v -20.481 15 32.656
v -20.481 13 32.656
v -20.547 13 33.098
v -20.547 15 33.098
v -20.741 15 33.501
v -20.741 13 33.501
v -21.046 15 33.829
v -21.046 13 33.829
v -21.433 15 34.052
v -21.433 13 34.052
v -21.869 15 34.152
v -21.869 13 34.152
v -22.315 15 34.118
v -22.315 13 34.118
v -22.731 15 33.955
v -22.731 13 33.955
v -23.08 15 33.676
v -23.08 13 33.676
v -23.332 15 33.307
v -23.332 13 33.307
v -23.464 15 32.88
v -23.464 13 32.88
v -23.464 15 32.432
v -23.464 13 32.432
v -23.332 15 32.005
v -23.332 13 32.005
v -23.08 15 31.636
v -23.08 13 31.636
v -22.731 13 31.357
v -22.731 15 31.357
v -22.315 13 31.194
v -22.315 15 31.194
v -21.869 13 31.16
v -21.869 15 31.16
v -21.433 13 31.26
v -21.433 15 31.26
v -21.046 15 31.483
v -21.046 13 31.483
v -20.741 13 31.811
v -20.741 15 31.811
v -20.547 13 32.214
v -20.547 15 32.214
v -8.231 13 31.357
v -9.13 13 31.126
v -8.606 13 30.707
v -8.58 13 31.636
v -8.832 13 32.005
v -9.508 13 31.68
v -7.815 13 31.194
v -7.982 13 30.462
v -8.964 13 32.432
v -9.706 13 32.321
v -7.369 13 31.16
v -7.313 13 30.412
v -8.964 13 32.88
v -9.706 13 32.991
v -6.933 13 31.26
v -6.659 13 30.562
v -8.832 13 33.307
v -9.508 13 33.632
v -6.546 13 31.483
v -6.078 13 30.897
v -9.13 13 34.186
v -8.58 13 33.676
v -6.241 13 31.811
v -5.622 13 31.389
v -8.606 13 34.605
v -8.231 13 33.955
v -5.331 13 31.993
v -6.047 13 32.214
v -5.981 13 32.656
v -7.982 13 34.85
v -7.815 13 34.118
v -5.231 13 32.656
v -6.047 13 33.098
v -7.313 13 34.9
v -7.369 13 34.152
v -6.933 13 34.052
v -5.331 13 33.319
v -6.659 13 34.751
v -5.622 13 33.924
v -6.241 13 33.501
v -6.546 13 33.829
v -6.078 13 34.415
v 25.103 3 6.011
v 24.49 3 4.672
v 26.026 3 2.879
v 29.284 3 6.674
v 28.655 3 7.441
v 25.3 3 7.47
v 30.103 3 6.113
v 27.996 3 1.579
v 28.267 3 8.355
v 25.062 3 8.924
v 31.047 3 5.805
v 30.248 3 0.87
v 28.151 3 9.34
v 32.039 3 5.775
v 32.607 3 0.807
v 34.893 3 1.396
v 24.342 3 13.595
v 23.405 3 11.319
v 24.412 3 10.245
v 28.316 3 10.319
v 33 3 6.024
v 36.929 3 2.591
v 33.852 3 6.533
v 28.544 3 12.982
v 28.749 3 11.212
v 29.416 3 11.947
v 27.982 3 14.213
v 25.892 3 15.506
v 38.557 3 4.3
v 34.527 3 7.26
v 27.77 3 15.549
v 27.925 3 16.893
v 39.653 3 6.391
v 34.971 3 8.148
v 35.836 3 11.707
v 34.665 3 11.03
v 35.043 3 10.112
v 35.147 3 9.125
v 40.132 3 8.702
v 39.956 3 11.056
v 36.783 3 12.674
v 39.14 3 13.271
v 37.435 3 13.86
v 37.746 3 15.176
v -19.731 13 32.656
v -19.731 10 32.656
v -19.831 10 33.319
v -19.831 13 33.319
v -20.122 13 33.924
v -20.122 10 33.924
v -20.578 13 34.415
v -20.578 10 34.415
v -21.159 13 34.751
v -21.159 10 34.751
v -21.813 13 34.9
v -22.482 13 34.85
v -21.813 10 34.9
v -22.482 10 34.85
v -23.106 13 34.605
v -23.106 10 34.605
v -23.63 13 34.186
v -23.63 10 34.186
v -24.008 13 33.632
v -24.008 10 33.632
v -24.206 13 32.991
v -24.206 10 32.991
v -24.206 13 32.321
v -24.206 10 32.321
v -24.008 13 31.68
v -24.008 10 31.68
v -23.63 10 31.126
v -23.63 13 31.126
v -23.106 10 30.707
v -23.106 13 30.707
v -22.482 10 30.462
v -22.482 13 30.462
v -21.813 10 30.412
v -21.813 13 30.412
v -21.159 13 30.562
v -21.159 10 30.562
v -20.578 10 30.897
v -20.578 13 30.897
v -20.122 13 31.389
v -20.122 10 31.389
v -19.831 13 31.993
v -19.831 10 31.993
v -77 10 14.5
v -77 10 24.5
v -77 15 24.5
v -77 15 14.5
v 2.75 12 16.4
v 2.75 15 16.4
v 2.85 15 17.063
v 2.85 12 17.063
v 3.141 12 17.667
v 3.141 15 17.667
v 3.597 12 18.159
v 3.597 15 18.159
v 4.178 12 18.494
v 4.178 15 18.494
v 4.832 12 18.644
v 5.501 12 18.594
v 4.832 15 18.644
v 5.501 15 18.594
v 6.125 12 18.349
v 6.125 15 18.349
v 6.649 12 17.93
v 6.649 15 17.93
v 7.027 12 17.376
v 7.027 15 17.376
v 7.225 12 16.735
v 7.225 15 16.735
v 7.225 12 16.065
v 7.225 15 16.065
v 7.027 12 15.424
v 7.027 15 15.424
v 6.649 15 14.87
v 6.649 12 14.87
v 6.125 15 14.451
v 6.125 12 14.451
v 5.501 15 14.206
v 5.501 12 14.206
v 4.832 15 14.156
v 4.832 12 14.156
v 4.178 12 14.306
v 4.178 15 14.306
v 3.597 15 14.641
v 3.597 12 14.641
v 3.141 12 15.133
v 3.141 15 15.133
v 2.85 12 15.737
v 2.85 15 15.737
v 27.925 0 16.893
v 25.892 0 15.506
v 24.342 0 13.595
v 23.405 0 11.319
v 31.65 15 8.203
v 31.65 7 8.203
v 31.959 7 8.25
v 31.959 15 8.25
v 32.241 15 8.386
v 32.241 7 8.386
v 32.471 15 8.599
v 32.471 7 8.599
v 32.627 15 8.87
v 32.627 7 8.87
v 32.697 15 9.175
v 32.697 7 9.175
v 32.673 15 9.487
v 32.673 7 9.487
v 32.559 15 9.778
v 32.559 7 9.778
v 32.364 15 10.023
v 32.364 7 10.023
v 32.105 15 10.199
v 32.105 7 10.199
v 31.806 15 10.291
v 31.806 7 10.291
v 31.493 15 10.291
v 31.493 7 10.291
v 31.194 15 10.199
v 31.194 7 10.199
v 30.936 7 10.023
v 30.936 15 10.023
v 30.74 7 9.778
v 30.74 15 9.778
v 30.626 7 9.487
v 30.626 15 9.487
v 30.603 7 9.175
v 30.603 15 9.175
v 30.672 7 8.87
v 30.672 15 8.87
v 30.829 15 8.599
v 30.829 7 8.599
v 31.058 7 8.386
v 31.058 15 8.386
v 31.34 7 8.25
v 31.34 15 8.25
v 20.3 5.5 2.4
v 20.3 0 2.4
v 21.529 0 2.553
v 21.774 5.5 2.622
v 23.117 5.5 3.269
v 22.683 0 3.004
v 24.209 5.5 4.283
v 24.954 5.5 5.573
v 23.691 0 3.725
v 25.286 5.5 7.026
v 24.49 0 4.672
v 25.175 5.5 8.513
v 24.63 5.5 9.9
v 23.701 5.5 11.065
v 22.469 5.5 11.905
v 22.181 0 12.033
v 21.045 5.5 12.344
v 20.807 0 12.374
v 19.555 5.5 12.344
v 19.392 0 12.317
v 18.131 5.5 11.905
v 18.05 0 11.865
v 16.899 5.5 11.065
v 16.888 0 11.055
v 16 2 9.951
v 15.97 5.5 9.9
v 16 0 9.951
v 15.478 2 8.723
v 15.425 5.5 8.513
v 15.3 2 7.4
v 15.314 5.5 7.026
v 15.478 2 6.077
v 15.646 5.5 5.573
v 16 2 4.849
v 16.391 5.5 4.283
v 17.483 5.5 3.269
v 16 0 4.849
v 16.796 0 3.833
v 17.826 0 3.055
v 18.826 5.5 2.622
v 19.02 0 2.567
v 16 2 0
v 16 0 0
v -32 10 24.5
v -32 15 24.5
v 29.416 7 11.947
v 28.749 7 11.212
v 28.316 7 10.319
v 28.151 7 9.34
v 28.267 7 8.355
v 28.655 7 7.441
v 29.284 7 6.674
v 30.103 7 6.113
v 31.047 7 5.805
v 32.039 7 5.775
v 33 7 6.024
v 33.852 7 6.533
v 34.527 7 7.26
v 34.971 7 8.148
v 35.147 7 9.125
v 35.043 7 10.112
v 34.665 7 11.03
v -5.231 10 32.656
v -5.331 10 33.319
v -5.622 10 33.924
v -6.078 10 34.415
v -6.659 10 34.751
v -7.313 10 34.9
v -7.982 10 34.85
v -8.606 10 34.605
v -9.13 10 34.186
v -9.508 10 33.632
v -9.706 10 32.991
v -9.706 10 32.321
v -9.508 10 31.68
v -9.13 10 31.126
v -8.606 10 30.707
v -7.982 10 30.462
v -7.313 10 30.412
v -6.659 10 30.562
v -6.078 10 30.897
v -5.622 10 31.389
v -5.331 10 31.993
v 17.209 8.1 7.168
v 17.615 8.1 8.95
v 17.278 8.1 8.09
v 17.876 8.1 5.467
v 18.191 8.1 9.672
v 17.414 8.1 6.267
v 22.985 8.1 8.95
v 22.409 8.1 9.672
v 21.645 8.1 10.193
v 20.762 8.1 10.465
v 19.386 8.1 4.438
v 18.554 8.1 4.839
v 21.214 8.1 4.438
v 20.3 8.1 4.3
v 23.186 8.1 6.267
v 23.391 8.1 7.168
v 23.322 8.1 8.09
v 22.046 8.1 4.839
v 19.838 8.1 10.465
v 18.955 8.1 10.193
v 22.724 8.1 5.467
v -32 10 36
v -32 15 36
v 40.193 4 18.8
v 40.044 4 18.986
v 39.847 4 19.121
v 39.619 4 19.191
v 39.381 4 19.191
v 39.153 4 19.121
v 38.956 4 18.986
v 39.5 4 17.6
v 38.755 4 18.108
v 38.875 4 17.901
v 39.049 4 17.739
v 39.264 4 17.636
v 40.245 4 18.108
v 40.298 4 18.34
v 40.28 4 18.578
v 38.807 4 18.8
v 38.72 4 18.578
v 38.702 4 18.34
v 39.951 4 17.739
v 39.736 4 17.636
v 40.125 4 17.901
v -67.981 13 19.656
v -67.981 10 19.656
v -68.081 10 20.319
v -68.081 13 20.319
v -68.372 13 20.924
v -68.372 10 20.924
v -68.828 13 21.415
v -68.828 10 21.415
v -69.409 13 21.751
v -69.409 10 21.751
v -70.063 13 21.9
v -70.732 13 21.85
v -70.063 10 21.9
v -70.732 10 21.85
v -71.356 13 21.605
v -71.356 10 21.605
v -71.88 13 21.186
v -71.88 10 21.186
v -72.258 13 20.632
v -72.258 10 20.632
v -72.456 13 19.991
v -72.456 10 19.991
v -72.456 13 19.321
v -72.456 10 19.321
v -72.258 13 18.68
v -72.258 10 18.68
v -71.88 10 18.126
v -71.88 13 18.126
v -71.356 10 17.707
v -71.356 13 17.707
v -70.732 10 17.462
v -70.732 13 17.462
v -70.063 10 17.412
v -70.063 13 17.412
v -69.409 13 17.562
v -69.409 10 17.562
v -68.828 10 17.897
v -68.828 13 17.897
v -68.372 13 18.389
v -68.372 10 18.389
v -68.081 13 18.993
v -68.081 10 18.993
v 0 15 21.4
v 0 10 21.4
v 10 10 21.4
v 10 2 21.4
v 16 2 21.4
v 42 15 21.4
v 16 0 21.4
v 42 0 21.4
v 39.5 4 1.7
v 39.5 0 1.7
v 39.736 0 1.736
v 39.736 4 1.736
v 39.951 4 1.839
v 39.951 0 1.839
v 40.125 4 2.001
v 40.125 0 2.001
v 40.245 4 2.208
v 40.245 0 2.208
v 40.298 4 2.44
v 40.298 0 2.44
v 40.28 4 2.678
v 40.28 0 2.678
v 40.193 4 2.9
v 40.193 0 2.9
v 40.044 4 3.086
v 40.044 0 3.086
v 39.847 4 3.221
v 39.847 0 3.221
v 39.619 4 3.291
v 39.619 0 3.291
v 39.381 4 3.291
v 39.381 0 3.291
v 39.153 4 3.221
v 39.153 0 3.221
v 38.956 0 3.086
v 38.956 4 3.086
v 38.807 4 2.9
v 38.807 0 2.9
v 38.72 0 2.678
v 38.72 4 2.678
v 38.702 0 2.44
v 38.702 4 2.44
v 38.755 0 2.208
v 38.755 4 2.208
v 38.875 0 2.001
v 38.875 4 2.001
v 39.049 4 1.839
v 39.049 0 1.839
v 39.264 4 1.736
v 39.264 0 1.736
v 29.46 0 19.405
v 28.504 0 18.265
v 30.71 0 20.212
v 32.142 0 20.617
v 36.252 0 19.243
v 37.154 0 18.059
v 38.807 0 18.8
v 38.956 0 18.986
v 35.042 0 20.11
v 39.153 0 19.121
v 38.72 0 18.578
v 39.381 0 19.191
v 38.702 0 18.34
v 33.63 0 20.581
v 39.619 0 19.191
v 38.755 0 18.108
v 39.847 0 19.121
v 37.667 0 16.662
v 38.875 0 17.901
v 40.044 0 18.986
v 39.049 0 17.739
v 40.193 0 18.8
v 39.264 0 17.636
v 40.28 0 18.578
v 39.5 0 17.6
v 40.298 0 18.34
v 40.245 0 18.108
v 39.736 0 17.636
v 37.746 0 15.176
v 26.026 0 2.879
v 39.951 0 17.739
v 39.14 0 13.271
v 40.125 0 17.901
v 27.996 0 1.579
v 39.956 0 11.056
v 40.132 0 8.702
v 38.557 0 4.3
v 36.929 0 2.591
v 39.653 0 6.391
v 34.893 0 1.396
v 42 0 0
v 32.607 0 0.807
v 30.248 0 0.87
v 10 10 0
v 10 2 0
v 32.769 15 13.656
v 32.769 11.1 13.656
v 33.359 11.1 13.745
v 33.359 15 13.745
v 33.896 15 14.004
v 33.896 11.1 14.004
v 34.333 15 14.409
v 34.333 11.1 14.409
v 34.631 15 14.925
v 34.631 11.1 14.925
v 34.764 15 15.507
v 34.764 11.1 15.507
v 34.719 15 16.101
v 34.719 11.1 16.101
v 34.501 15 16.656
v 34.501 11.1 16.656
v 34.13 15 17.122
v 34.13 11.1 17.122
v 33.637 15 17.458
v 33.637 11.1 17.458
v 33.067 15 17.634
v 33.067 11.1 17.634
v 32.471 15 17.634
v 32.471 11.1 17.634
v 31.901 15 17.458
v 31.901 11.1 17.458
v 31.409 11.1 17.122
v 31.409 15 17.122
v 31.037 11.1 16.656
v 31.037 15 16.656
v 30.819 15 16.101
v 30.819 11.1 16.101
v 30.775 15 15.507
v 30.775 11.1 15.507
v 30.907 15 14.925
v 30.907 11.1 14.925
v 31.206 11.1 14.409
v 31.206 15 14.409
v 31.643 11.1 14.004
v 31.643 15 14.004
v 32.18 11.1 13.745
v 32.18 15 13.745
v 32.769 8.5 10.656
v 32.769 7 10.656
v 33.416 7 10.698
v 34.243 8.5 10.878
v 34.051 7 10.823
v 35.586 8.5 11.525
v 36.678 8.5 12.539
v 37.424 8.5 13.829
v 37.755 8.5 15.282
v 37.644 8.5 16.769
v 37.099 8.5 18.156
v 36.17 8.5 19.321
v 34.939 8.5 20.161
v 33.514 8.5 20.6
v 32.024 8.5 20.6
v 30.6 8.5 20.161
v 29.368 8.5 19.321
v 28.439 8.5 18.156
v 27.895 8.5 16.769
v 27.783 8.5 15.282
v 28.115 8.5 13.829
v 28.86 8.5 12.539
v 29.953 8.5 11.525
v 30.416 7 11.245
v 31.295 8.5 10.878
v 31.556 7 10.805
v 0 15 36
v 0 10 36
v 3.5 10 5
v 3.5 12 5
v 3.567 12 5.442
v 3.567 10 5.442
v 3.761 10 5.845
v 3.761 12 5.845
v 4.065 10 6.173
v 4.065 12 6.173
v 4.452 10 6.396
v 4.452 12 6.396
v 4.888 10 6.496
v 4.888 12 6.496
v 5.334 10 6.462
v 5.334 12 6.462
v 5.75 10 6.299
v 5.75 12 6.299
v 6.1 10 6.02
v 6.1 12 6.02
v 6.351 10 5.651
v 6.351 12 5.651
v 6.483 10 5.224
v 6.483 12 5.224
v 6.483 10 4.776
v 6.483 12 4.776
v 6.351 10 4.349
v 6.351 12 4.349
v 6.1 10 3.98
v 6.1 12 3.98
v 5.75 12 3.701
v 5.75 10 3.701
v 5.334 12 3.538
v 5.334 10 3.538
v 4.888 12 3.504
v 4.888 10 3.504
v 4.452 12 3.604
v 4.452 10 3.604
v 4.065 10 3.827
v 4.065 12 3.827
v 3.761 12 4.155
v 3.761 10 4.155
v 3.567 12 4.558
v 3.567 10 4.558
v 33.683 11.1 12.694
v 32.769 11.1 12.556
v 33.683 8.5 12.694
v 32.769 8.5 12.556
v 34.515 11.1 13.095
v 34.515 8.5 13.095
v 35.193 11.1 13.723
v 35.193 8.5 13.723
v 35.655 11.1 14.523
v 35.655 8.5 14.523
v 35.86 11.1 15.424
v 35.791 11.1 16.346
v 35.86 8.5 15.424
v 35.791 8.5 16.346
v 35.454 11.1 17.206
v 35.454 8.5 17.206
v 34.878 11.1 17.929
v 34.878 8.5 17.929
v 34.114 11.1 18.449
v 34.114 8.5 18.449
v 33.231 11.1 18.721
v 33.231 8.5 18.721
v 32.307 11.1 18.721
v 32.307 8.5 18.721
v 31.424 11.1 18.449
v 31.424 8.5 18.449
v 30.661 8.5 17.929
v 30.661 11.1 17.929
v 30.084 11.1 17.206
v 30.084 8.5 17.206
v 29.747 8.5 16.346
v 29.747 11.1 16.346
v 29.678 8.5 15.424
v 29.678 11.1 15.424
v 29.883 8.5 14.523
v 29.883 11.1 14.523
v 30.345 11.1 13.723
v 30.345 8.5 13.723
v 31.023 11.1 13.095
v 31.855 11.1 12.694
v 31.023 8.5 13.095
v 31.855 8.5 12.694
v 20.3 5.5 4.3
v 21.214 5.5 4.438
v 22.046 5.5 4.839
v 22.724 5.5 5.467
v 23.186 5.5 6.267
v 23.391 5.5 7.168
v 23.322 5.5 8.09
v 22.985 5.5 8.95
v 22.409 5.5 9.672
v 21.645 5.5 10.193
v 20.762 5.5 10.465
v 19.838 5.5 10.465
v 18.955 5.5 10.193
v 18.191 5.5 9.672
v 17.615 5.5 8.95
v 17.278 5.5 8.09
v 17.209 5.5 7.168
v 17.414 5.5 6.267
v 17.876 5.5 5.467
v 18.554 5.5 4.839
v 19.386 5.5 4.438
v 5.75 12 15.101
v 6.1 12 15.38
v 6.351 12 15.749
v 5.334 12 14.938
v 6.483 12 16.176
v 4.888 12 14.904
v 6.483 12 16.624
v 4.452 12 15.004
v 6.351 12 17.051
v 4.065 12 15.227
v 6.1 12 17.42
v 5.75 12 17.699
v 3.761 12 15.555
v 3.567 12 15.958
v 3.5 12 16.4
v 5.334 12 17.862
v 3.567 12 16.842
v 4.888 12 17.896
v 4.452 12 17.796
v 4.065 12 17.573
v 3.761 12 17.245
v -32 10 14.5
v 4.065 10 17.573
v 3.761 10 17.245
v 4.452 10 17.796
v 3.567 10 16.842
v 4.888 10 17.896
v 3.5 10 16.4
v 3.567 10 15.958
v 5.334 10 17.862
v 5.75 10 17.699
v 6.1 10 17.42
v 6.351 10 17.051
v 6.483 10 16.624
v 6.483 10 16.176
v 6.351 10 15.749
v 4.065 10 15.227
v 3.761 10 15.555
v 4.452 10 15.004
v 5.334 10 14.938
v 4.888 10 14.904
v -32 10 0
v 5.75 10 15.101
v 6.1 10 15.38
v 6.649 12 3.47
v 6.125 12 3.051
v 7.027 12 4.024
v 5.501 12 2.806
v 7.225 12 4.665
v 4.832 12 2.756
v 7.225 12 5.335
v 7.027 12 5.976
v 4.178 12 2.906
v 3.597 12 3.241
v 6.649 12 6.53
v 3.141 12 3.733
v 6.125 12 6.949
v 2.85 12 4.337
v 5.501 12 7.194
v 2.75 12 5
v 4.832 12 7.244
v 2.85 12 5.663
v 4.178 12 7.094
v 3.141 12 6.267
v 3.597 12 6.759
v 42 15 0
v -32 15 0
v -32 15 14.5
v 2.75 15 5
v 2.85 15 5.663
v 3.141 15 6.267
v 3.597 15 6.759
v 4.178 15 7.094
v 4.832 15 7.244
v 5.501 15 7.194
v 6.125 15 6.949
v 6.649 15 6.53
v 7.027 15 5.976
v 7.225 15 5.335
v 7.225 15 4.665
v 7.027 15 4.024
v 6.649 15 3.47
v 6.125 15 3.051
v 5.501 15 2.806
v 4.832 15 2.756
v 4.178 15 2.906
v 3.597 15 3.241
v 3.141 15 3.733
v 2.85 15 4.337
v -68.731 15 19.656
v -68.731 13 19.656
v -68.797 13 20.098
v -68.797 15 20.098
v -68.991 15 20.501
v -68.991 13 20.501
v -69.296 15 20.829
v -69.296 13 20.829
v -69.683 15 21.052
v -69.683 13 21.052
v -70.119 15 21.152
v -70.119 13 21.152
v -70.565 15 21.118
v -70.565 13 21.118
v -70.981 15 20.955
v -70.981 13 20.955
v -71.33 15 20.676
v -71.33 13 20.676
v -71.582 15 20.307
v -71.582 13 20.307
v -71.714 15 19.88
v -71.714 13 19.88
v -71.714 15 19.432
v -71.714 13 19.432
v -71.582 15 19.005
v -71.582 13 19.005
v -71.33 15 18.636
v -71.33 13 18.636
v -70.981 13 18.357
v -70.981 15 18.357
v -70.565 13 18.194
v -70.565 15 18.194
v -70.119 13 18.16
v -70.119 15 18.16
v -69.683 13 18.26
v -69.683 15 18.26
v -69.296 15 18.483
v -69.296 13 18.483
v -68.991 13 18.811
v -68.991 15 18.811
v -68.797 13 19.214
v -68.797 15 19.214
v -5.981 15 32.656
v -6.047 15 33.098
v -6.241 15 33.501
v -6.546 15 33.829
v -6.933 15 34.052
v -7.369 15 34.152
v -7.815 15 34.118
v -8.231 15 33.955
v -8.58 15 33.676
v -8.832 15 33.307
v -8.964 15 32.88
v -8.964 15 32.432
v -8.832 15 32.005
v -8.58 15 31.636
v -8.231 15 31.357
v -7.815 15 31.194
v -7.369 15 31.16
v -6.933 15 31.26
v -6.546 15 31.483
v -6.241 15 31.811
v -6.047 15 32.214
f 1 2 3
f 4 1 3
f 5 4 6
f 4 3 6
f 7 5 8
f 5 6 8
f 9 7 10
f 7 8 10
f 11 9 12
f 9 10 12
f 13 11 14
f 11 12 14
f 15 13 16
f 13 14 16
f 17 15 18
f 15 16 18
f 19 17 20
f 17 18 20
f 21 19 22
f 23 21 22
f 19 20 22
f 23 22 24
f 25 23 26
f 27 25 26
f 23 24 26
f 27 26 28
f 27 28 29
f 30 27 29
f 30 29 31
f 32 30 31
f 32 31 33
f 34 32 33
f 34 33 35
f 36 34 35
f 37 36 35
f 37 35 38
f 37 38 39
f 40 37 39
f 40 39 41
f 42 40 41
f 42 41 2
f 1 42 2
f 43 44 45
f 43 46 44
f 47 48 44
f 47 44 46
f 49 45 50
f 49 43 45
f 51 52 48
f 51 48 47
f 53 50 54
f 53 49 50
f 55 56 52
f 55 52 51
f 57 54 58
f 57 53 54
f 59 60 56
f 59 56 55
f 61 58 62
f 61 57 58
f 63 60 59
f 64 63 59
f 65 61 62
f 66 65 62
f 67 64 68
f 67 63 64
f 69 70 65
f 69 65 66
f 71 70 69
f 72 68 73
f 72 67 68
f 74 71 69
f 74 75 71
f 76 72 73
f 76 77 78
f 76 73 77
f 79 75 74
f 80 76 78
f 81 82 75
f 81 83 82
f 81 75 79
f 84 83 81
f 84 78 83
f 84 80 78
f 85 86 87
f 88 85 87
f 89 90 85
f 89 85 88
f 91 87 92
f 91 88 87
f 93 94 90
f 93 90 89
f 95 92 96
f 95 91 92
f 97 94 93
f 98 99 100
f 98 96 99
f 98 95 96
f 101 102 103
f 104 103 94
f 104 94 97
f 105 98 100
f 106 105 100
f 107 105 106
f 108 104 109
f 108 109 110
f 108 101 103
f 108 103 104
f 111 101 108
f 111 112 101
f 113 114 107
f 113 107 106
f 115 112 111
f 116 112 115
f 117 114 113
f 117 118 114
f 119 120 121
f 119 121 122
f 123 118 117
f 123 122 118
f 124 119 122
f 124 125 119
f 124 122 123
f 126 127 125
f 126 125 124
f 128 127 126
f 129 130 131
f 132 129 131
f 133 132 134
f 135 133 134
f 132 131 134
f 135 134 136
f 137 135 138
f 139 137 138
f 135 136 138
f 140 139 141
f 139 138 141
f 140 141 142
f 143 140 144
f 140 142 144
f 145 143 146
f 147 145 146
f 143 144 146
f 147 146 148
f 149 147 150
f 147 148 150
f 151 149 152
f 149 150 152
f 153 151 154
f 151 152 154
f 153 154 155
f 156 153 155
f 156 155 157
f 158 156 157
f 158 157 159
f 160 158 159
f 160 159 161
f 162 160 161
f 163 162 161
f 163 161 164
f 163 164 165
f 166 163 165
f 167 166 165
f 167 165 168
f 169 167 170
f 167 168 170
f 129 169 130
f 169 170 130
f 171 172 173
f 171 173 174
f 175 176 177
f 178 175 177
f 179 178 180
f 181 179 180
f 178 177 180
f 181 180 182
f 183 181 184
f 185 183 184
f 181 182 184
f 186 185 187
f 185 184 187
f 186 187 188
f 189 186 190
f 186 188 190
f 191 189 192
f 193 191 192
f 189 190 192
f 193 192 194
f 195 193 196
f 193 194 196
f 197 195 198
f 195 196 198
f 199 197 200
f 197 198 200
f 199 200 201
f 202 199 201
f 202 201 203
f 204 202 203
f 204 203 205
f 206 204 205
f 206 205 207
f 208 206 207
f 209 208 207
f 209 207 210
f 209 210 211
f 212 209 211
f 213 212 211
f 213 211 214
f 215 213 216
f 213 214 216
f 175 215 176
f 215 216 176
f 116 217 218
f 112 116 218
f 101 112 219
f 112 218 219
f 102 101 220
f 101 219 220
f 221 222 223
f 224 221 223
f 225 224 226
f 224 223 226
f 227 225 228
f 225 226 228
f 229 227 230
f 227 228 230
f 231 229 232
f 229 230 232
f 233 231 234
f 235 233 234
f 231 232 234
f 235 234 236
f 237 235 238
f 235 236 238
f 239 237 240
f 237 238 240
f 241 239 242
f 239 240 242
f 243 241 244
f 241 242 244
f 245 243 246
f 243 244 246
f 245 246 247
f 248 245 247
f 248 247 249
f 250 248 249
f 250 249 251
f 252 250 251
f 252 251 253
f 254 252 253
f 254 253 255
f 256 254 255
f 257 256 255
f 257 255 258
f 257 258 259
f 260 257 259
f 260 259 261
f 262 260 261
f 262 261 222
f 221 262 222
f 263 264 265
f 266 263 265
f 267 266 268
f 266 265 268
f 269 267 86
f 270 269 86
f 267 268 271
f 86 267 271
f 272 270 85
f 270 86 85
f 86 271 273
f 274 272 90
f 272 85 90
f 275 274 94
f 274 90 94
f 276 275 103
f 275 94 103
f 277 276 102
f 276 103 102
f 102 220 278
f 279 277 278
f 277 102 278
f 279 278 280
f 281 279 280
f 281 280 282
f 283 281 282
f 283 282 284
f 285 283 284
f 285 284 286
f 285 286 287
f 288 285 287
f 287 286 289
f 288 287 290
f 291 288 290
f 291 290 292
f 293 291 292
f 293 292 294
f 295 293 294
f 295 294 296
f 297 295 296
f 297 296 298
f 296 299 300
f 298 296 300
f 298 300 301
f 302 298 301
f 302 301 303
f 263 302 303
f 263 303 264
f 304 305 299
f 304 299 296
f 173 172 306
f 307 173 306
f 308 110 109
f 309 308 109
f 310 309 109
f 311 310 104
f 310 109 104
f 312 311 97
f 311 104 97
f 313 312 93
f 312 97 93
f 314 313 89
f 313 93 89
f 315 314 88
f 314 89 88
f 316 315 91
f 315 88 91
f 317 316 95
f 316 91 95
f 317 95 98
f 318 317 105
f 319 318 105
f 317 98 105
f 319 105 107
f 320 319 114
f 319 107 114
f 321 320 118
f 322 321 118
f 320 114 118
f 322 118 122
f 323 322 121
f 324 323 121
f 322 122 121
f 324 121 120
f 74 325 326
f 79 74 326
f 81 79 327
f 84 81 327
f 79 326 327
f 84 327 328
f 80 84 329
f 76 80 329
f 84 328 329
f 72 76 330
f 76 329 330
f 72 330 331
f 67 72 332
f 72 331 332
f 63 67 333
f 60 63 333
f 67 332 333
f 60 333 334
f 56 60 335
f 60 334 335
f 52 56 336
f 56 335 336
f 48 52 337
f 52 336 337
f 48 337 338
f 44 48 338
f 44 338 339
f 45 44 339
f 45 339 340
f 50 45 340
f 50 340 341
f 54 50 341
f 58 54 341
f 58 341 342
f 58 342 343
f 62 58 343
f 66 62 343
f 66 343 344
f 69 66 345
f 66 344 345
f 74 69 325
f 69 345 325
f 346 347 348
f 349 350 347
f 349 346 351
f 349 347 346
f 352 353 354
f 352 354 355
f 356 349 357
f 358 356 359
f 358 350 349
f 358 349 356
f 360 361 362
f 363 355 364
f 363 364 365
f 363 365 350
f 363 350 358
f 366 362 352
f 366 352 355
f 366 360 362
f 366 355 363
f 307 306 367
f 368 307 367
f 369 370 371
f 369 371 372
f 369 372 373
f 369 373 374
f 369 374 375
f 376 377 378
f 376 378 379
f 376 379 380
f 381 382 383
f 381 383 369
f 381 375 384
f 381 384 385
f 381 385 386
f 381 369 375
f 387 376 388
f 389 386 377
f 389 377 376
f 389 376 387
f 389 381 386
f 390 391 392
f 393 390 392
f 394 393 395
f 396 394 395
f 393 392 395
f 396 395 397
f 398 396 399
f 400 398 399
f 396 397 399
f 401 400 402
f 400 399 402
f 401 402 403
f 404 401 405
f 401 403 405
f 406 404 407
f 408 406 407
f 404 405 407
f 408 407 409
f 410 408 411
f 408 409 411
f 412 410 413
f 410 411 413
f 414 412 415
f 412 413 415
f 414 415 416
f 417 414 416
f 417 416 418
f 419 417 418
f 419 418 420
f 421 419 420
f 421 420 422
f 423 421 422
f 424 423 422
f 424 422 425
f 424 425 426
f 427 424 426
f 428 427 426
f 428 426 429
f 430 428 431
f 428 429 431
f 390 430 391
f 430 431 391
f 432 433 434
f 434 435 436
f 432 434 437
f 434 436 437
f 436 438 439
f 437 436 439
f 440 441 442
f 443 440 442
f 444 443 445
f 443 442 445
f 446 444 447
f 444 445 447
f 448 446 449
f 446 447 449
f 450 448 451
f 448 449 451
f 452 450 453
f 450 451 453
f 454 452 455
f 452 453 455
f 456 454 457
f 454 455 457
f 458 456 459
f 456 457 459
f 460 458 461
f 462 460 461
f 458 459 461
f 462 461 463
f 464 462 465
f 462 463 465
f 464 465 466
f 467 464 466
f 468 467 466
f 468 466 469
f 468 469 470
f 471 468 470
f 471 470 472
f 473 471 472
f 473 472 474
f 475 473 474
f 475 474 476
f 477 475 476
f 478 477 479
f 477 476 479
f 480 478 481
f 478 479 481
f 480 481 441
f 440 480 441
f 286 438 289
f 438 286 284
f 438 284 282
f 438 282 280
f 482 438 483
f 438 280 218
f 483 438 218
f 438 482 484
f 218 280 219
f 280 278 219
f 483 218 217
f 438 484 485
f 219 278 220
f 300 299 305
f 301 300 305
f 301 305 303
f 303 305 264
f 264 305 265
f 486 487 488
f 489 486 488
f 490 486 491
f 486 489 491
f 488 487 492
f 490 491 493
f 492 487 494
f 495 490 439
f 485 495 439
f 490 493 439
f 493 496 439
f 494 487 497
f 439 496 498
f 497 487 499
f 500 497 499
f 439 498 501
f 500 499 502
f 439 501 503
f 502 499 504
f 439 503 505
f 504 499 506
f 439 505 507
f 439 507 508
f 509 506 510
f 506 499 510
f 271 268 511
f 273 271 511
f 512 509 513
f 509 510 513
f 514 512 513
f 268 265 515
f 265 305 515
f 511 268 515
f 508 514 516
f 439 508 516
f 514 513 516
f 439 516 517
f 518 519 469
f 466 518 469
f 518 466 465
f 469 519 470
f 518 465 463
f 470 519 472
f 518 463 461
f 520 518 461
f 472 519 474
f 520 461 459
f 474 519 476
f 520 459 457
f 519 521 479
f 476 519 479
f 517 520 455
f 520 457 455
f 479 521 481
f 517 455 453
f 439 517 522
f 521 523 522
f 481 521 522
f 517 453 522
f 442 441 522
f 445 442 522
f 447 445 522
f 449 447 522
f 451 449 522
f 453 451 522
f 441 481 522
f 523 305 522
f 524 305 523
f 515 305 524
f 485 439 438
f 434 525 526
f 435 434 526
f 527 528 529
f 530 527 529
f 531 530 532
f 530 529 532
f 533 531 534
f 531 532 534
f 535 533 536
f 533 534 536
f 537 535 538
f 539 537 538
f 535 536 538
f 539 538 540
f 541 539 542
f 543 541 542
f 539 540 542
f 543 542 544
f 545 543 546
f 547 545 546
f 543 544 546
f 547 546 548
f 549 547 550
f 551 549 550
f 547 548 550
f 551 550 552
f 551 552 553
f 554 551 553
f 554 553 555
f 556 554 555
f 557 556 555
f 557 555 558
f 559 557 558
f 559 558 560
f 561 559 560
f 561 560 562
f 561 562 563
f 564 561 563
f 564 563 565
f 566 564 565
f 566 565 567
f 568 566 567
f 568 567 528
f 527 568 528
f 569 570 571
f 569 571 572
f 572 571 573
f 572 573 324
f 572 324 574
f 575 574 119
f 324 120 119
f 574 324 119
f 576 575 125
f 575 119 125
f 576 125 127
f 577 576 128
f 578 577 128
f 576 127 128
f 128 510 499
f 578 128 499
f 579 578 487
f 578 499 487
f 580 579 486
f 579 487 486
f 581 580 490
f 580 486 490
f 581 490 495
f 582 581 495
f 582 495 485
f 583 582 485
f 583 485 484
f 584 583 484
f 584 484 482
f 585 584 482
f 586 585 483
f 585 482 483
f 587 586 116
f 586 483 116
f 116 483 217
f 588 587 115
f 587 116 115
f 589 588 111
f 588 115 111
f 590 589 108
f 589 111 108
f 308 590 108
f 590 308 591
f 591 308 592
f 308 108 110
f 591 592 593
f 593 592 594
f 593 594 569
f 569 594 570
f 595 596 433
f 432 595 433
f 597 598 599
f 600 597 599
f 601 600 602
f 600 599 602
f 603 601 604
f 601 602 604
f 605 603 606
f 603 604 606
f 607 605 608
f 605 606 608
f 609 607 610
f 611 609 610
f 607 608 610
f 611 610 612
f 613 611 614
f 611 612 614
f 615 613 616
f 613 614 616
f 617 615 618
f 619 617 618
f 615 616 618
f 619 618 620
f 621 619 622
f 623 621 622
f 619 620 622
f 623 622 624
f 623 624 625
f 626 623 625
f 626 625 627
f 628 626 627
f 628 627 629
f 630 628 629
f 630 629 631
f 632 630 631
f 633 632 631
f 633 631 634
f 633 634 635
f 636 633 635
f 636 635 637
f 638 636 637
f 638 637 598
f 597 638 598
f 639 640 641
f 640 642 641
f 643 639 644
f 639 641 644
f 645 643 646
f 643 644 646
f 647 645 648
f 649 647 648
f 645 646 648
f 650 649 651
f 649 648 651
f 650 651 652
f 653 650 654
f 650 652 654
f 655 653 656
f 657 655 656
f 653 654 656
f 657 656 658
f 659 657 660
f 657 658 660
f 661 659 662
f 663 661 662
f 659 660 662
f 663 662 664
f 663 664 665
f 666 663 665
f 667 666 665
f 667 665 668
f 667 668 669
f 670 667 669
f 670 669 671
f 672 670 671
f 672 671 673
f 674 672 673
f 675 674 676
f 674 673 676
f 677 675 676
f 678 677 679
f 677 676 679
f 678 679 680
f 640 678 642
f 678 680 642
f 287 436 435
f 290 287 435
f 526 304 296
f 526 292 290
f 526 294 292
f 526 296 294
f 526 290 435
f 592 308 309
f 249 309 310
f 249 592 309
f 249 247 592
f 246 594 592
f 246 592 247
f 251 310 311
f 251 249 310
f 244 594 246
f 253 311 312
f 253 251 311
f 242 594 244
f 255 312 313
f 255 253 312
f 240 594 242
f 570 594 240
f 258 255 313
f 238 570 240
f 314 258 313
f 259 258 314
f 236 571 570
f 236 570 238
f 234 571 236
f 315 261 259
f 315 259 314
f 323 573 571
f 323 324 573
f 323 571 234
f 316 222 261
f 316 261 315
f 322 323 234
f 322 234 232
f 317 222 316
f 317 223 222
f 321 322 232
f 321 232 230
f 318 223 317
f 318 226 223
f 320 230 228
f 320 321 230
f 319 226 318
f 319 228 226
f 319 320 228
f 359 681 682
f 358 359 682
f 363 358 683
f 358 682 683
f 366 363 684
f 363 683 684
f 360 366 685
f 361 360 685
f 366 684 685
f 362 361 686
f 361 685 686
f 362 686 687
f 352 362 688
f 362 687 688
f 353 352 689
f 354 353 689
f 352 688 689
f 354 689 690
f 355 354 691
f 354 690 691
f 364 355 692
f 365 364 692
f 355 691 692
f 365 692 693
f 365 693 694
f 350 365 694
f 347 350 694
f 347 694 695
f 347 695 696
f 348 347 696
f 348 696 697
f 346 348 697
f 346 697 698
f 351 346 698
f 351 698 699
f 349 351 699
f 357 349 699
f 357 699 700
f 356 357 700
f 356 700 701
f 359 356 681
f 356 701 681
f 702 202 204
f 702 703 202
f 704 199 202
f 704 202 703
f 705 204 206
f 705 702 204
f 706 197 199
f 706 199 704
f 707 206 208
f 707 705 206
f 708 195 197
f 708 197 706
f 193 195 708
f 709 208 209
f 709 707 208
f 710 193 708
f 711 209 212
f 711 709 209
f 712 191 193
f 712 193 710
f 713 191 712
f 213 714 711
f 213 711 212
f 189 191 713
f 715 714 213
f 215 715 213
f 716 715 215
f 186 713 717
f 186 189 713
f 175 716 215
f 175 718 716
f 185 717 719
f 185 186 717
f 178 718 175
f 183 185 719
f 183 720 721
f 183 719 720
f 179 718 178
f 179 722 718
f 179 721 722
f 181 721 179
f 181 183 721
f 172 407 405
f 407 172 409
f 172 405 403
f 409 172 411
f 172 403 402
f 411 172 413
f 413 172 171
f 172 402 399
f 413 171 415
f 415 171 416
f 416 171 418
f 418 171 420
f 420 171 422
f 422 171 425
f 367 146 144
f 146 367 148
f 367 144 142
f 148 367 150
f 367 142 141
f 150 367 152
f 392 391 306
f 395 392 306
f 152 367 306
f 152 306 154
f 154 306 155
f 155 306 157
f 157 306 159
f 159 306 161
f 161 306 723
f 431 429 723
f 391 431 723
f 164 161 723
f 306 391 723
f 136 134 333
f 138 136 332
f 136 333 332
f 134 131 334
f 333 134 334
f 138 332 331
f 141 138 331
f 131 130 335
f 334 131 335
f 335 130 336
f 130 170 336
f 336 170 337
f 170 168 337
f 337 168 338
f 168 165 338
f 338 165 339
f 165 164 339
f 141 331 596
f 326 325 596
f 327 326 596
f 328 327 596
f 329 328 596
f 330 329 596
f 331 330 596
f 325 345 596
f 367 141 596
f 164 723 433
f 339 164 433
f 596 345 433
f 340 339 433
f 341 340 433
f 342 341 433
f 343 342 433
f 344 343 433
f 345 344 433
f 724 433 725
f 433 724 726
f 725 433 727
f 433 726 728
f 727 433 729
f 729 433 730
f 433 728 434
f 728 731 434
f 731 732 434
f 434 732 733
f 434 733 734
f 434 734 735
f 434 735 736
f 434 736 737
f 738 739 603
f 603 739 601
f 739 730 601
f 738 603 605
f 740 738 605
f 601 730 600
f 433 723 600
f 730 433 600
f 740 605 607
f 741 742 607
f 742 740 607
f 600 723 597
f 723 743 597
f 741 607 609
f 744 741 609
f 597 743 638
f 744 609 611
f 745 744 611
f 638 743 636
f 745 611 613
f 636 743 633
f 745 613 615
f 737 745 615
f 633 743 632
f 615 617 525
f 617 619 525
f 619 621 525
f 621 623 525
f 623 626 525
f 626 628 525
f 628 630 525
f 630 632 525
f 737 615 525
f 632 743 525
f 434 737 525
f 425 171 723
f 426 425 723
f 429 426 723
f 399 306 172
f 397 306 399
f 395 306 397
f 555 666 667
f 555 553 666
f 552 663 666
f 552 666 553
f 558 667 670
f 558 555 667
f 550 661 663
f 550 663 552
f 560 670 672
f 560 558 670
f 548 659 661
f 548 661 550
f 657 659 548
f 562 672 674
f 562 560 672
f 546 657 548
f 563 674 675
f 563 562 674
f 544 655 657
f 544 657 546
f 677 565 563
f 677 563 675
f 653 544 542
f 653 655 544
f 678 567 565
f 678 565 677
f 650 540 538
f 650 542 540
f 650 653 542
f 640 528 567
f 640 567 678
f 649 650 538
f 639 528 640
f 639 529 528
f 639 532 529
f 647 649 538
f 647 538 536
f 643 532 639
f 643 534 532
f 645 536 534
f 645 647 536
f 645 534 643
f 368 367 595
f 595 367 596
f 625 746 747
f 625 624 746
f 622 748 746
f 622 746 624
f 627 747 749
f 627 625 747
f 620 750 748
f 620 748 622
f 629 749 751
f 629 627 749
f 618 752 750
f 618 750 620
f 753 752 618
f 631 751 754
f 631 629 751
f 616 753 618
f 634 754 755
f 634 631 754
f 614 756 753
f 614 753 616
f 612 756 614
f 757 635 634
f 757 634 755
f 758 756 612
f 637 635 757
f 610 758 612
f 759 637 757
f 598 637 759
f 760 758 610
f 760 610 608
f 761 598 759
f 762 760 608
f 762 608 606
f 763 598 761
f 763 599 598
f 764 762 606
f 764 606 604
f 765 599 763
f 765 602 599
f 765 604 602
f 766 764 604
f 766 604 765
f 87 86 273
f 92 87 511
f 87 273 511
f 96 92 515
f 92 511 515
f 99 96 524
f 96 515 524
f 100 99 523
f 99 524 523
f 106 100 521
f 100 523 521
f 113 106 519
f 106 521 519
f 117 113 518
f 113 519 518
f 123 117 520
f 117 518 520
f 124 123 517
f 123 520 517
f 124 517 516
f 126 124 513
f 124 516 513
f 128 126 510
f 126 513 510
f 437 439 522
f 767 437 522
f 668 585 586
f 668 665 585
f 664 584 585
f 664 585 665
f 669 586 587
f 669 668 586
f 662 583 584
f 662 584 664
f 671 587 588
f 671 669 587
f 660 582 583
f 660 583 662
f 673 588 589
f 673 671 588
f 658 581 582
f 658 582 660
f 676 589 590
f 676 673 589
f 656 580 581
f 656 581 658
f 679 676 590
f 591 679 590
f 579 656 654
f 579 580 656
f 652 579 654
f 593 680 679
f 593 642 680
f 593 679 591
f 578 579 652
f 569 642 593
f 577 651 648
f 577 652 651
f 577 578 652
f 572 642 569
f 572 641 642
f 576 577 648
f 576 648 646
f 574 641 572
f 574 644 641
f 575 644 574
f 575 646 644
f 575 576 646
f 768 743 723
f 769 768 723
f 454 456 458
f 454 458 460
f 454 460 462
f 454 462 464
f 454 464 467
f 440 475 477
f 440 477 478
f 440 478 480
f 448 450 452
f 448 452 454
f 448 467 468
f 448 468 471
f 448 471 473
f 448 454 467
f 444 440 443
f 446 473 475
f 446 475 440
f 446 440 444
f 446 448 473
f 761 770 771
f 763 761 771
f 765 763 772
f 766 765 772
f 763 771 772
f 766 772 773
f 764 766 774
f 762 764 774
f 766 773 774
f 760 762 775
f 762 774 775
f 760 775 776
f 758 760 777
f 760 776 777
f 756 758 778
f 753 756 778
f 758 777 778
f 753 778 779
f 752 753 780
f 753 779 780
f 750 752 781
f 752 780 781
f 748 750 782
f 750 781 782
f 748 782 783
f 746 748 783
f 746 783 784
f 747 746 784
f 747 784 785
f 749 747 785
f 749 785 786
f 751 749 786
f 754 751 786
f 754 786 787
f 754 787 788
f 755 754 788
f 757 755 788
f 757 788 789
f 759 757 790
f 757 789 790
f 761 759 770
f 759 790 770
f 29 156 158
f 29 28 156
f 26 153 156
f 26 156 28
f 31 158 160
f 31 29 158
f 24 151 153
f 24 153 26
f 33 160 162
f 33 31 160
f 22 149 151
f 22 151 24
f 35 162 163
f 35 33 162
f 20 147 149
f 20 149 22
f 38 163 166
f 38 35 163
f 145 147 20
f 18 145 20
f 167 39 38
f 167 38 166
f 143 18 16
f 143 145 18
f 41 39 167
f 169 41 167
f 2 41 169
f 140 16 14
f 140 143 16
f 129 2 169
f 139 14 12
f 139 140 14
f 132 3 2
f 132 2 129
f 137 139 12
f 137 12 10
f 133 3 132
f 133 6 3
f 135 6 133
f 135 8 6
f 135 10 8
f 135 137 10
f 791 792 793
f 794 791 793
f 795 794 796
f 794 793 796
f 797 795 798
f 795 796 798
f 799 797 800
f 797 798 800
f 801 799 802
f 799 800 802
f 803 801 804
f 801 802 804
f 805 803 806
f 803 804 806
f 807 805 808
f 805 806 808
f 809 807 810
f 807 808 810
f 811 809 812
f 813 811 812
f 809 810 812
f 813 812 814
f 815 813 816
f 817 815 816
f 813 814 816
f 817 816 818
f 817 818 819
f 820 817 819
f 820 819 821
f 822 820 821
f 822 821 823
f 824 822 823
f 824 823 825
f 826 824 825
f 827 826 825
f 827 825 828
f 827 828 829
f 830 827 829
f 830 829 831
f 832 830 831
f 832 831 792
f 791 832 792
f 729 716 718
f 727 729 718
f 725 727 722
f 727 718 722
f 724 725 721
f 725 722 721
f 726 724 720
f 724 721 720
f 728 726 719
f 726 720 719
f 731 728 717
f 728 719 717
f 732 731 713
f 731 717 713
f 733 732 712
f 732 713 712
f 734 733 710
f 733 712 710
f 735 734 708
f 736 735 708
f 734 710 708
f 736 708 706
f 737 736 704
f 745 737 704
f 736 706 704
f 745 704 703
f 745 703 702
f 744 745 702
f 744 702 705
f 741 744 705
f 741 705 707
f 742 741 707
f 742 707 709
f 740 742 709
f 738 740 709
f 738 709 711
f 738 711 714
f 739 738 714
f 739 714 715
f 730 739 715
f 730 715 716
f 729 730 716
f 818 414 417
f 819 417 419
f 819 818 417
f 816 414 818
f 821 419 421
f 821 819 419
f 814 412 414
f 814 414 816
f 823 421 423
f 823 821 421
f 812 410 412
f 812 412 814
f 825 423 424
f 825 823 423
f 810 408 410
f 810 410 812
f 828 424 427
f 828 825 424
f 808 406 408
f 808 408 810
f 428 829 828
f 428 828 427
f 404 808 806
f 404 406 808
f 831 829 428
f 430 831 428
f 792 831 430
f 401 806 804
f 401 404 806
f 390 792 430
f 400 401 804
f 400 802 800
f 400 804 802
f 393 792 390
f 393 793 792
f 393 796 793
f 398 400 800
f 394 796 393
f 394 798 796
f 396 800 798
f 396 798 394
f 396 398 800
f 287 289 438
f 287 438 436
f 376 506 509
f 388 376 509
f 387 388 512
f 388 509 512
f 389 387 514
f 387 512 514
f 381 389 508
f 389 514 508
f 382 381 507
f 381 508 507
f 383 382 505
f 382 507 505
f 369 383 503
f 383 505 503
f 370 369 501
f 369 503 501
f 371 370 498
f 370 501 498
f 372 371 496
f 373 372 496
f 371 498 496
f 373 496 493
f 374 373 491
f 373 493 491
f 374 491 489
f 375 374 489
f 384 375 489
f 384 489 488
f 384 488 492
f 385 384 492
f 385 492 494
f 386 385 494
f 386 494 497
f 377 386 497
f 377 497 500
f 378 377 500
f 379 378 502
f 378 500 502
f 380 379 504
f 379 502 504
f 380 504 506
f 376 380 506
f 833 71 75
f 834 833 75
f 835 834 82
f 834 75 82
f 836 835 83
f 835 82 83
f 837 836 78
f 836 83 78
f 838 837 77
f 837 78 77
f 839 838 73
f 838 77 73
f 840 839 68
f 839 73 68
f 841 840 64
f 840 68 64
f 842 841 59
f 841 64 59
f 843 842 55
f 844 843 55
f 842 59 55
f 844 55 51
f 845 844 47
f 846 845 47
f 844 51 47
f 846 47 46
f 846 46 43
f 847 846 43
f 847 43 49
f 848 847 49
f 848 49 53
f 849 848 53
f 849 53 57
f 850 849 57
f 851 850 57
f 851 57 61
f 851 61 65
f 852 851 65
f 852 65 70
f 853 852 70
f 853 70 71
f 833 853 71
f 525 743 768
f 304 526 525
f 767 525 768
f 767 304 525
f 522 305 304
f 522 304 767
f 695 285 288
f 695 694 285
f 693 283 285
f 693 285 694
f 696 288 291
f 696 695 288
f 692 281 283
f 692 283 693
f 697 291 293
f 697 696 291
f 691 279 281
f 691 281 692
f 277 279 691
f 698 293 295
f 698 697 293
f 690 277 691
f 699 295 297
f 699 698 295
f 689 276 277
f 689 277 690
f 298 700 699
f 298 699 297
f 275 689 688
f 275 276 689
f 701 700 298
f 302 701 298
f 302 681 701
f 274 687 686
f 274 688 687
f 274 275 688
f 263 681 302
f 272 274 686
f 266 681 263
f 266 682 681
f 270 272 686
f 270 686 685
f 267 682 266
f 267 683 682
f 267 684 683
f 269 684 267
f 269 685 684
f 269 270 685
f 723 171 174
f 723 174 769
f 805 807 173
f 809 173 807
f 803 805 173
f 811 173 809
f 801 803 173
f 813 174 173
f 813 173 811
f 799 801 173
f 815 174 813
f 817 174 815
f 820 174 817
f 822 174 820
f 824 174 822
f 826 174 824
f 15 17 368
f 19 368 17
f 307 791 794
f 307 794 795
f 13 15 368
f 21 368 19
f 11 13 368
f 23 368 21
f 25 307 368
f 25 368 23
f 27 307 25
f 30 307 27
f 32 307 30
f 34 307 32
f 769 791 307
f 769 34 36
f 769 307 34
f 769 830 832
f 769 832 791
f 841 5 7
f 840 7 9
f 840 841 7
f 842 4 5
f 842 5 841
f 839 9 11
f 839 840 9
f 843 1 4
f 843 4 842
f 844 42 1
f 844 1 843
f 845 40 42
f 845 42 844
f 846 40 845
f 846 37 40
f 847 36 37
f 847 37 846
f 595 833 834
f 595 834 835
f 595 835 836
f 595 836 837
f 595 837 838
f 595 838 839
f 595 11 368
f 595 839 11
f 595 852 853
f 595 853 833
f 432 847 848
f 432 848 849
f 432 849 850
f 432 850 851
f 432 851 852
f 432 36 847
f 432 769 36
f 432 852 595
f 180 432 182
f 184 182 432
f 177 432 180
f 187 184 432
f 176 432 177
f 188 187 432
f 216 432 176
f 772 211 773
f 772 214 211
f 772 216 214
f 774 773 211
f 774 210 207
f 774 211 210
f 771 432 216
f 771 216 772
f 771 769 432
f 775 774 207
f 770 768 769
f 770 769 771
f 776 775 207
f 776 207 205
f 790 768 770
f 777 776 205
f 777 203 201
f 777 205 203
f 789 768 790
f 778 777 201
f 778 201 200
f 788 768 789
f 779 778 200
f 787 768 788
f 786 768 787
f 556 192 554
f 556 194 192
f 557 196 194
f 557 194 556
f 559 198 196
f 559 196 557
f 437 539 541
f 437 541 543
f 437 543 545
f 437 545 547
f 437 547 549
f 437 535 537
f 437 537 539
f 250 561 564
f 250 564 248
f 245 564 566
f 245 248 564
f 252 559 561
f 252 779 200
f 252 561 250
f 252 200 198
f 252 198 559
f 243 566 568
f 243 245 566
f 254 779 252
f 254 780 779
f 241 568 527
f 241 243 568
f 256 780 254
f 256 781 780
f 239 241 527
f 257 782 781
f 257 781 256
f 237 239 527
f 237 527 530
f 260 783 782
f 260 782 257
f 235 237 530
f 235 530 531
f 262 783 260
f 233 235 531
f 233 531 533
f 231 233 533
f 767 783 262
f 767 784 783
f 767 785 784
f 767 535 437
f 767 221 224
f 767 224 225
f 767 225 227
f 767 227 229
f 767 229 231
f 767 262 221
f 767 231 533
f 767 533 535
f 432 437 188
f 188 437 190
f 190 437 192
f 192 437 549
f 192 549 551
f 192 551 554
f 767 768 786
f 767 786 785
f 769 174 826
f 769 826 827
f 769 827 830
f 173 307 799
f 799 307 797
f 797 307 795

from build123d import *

# Parameters (mm, degrees)
SKETCH_1_W           = 42
SKETCH_1_H           = 21.4
EXTRUDE_1_DEPTH      = 12
SKETCH_2_W           = 6
SKETCH_2_H           = 2
CUT_EXTRUDE_1_DEPTH  = 49.641134855
SKETCH_3_R           = 5
CUT_EXTRUDE_2_DEPTH  = 5.5
SKETCH_3_3_R         = 8.5
CUT_EXTRUDE_3_DEPTH  = 3
SKETCH_3_4_R         = 3.5
CUT_EXTRUDE_4_DEPTH  = 7
SKETCH_3_5_R         = 5
CUT_EXTRUDE_5_DEPTH  = 8.5
CUT_EXTRUDE_START    = -8.5
SKETCH_3_6_R         = 3.1
CUT_EXTRUDE_6_DEPTH  = 2.6
CUT_EXTRUDE_START_2  = -5.5
SKETCH_3_7_R         = 3.1
CUT_EXTRUDE_7_DEPTH  = 2.6
EXTRUDE_START        = -2
SKETCH_4_W           = 42
SKETCH_4_H           = 21.4
SKETCH_4_W_2         = 45
SKETCH_4_H_2         = 10
EXTRUDE_2_DEPTH      = 5
SKETCH_5_R           = 2.25
CUT_EXTRUDE_8_DEPTH  = 3
SKETCH_5_3_R         = 1.5
CUT_EXTRUDE_9_DEPTH  = 86.586213843
SKETCH_3_8_R         = 1.05
SKETCH_3_8_R_2       = 2
CUT_EXTRUDE_10_DEPTH = 87.313382508
SKETCH_6_R           = 1.5
CUT_EXTRUDE_11_DEPTH = 87.313382508
SKETCH_6_3_R         = 2.25
CUT_EXTRUDE_12_DEPTH = 3
SKETCH_7_R           = 0.8
CUT_EXTRUDE_13_DEPTH = 4
SKETCH_3_9_R         = 3.1
CUT_EXTRUDE_14_DEPTH = 2.6


with BuildPart() as part:
    # 草图1 → 凸台-拉伸1 (new body)
    with BuildSketch(Plane(origin=(0, 0, 0), x_dir=(1, 0, 0), z_dir=(0, 1, 0))):
        with Locations((21, -10.7)):
            Rectangle(SKETCH_1_W, SKETCH_1_H)
    extrude(amount=EXTRUDE_1_DEPTH)

    # 草图2 → 切除-拉伸1 (cut, through all)
    with BuildSketch(Plane(origin=(0, 0, 0), x_dir=(-1, 0, 0), z_dir=(0, 0, -1))):
        Polygon((-10, 0), (0, 0), (0, 10), (-10, 10), (-10, 2), align=None)
        with Locations((-13, 1)):
            Rectangle(SKETCH_2_W, SKETCH_2_H)
    extrude(amount=-CUT_EXTRUDE_1_DEPTH, mode=Mode.SUBTRACT)

    # 草图3 → 切除-拉伸2 (cut)
    with BuildSketch(Plane.XZ):
        with Locations(Location((20.3, 7.4, 0), (0, 0, 270))):
            Circle(SKETCH_3_R)
    extrude(amount=-CUT_EXTRUDE_2_DEPTH, mode=Mode.SUBTRACT)

    # 草图3<3> → 切除-拉伸3 (cut)
    with BuildSketch(Plane.XZ):
        with Locations((31.64970263, 9.253173011)):
            Circle(SKETCH_3_3_R)
    extrude(amount=-CUT_EXTRUDE_3_DEPTH, mode=Mode.SUBTRACT)

    # 草图3<4> → 切除-拉伸4 (cut)
    with BuildSketch(Plane.XZ):
        with Locations(Location((31.64970263, 9.253173011, 0), (0, 0, 270))):
            Circle(SKETCH_3_4_R)
    extrude(amount=-CUT_EXTRUDE_4_DEPTH, mode=Mode.SUBTRACT)

    # 草图3<5> → 切除-拉伸5 (cut)
    with BuildSketch(Plane.XZ):
        with Locations(Location((32.76916715, 15.656047301, 0), (0, 0, 270))):
            Circle(SKETCH_3_5_R)
    extrude(amount=-CUT_EXTRUDE_5_DEPTH, mode=Mode.SUBTRACT)

    # 草图3<6> → 切除-拉伸6 (cut)
    with BuildSketch(Plane.XZ.offset(CUT_EXTRUDE_START)):
        with Locations(Location((32.76916715, 15.656047301, 0), (0, 0, 270))):
            Circle(SKETCH_3_6_R)
    extrude(amount=-CUT_EXTRUDE_6_DEPTH, mode=Mode.SUBTRACT)

    # 草图3<7> → 切除-拉伸7 (cut)
    with BuildSketch(Plane.XZ.offset(CUT_EXTRUDE_START_2)):
        with Locations(Location((20.3, 7.4, 0), (0, 0, 270))):
            Circle(SKETCH_3_7_R)
    extrude(amount=-CUT_EXTRUDE_7_DEPTH, mode=Mode.SUBTRACT)

    # 草图4 → 凸台-拉伸2 (add)
    with BuildSketch(Plane(origin=(0, 12, 0), x_dir=(1, 0, 0), z_dir=(0, 1, 0)).offset(EXTRUDE_START)):
        with Locations((21, -10.7)):
            Rectangle(SKETCH_4_W, SKETCH_4_H)
        Polygon((0, -21.4), (0, 0), (-32, 0), (-32, -14.5), (-32, -24.5), (-32, -36), (0, -36), align=None)
        with Locations((-54.5, -19.5)):
            Rectangle(SKETCH_4_W_2, SKETCH_4_H_2)
    extrude(amount=EXTRUDE_2_DEPTH)

    # 草图5 → 切除-拉伸8 (cut)
    with BuildSketch(Plane.XZ.offset(-10)):
        with Locations((-7.480832871, 32.656047307)):
            Circle(SKETCH_5_R)
        with Locations((-21.980832871, 32.656047307)):
            Circle(SKETCH_5_R)
        with Locations((-70.230832871, 19.656047307)):
            Circle(SKETCH_5_R)
    extrude(amount=-CUT_EXTRUDE_8_DEPTH, mode=Mode.SUBTRACT)

    # 草图5<3> → 切除-拉伸9 (cut, through all)
    with BuildSketch(Plane.XZ.offset(-10)):
        with Locations((-70.230832871, 19.656047307)):
            Circle(SKETCH_5_3_R)
        with Locations((-21.980832871, 32.656047307)):
            Circle(SKETCH_5_3_R)
        with Locations((-7.480832871, 32.656047307)):
            Circle(SKETCH_5_3_R)
    extrude(amount=-CUT_EXTRUDE_9_DEPTH, mode=Mode.SUBTRACT)

    # 草图3<8> → 切除-拉伸10 (cut, through all)
    with BuildSketch(Plane.XZ):
        with Locations(Location((31.64970263, 9.253173011, 0), (0, 0, 270))):
            Circle(SKETCH_3_8_R)
        with Locations(Location((32.76916715, 15.656047301, 0), (0, 0, 270))):
            Circle(SKETCH_3_8_R_2)
    extrude(amount=-CUT_EXTRUDE_10_DEPTH, mode=Mode.SUBTRACT)

    # 草图6 → 切除-拉伸11 (cut, through all)
    with BuildSketch(Plane(origin=(0, 15, 0), x_dir=(1, 0, 0), z_dir=(0, 1, 0))):
        with Locations(Location((5, -5, 0), (0, 0, 180))):
            Circle(SKETCH_6_R)
        with Locations(Location((5, -16.4, 0), (0, 0, 180))):
            Circle(SKETCH_6_R)
    extrude(amount=-CUT_EXTRUDE_11_DEPTH, mode=Mode.SUBTRACT)

    # 草图6<3> → 切除-拉伸12 (cut)
    with BuildSketch(Plane(origin=(0, 15, 0), x_dir=(1, 0, 0), z_dir=(0, 1, 0))):
        with Locations(Location((5, -5, 0), (0, 0, 180))):
            Circle(SKETCH_6_3_R)
        with Locations(Location((5, -16.4, 0), (0, 0, 180))):
            Circle(SKETCH_6_3_R)
    extrude(amount=-CUT_EXTRUDE_12_DEPTH, mode=Mode.SUBTRACT)

    # 草图7 → 切除-拉伸13 (cut)
    with BuildSketch(Plane.XZ):
        with Locations(Location((39.5, 18.4, 0), (0, 0, 270))):
            Circle(SKETCH_7_R)
        with Locations(Location((39.5, 2.5, 0), (0, 0, 270))):
            Circle(SKETCH_7_R)
    extrude(amount=-CUT_EXTRUDE_13_DEPTH, mode=Mode.SUBTRACT)

    # 草图3<9> → 切除-拉伸14 (cut)
    with BuildSketch(Plane.XZ.offset(CUT_EXTRUDE_START)):
        with Locations(Location((32.76916715, 15.656047301, 0), (0, 0, 270))):
            Circle(SKETCH_3_9_R)
    extrude(amount=-CUT_EXTRUDE_14_DEPTH, mode=Mode.SUBTRACT)


solid = part.part
